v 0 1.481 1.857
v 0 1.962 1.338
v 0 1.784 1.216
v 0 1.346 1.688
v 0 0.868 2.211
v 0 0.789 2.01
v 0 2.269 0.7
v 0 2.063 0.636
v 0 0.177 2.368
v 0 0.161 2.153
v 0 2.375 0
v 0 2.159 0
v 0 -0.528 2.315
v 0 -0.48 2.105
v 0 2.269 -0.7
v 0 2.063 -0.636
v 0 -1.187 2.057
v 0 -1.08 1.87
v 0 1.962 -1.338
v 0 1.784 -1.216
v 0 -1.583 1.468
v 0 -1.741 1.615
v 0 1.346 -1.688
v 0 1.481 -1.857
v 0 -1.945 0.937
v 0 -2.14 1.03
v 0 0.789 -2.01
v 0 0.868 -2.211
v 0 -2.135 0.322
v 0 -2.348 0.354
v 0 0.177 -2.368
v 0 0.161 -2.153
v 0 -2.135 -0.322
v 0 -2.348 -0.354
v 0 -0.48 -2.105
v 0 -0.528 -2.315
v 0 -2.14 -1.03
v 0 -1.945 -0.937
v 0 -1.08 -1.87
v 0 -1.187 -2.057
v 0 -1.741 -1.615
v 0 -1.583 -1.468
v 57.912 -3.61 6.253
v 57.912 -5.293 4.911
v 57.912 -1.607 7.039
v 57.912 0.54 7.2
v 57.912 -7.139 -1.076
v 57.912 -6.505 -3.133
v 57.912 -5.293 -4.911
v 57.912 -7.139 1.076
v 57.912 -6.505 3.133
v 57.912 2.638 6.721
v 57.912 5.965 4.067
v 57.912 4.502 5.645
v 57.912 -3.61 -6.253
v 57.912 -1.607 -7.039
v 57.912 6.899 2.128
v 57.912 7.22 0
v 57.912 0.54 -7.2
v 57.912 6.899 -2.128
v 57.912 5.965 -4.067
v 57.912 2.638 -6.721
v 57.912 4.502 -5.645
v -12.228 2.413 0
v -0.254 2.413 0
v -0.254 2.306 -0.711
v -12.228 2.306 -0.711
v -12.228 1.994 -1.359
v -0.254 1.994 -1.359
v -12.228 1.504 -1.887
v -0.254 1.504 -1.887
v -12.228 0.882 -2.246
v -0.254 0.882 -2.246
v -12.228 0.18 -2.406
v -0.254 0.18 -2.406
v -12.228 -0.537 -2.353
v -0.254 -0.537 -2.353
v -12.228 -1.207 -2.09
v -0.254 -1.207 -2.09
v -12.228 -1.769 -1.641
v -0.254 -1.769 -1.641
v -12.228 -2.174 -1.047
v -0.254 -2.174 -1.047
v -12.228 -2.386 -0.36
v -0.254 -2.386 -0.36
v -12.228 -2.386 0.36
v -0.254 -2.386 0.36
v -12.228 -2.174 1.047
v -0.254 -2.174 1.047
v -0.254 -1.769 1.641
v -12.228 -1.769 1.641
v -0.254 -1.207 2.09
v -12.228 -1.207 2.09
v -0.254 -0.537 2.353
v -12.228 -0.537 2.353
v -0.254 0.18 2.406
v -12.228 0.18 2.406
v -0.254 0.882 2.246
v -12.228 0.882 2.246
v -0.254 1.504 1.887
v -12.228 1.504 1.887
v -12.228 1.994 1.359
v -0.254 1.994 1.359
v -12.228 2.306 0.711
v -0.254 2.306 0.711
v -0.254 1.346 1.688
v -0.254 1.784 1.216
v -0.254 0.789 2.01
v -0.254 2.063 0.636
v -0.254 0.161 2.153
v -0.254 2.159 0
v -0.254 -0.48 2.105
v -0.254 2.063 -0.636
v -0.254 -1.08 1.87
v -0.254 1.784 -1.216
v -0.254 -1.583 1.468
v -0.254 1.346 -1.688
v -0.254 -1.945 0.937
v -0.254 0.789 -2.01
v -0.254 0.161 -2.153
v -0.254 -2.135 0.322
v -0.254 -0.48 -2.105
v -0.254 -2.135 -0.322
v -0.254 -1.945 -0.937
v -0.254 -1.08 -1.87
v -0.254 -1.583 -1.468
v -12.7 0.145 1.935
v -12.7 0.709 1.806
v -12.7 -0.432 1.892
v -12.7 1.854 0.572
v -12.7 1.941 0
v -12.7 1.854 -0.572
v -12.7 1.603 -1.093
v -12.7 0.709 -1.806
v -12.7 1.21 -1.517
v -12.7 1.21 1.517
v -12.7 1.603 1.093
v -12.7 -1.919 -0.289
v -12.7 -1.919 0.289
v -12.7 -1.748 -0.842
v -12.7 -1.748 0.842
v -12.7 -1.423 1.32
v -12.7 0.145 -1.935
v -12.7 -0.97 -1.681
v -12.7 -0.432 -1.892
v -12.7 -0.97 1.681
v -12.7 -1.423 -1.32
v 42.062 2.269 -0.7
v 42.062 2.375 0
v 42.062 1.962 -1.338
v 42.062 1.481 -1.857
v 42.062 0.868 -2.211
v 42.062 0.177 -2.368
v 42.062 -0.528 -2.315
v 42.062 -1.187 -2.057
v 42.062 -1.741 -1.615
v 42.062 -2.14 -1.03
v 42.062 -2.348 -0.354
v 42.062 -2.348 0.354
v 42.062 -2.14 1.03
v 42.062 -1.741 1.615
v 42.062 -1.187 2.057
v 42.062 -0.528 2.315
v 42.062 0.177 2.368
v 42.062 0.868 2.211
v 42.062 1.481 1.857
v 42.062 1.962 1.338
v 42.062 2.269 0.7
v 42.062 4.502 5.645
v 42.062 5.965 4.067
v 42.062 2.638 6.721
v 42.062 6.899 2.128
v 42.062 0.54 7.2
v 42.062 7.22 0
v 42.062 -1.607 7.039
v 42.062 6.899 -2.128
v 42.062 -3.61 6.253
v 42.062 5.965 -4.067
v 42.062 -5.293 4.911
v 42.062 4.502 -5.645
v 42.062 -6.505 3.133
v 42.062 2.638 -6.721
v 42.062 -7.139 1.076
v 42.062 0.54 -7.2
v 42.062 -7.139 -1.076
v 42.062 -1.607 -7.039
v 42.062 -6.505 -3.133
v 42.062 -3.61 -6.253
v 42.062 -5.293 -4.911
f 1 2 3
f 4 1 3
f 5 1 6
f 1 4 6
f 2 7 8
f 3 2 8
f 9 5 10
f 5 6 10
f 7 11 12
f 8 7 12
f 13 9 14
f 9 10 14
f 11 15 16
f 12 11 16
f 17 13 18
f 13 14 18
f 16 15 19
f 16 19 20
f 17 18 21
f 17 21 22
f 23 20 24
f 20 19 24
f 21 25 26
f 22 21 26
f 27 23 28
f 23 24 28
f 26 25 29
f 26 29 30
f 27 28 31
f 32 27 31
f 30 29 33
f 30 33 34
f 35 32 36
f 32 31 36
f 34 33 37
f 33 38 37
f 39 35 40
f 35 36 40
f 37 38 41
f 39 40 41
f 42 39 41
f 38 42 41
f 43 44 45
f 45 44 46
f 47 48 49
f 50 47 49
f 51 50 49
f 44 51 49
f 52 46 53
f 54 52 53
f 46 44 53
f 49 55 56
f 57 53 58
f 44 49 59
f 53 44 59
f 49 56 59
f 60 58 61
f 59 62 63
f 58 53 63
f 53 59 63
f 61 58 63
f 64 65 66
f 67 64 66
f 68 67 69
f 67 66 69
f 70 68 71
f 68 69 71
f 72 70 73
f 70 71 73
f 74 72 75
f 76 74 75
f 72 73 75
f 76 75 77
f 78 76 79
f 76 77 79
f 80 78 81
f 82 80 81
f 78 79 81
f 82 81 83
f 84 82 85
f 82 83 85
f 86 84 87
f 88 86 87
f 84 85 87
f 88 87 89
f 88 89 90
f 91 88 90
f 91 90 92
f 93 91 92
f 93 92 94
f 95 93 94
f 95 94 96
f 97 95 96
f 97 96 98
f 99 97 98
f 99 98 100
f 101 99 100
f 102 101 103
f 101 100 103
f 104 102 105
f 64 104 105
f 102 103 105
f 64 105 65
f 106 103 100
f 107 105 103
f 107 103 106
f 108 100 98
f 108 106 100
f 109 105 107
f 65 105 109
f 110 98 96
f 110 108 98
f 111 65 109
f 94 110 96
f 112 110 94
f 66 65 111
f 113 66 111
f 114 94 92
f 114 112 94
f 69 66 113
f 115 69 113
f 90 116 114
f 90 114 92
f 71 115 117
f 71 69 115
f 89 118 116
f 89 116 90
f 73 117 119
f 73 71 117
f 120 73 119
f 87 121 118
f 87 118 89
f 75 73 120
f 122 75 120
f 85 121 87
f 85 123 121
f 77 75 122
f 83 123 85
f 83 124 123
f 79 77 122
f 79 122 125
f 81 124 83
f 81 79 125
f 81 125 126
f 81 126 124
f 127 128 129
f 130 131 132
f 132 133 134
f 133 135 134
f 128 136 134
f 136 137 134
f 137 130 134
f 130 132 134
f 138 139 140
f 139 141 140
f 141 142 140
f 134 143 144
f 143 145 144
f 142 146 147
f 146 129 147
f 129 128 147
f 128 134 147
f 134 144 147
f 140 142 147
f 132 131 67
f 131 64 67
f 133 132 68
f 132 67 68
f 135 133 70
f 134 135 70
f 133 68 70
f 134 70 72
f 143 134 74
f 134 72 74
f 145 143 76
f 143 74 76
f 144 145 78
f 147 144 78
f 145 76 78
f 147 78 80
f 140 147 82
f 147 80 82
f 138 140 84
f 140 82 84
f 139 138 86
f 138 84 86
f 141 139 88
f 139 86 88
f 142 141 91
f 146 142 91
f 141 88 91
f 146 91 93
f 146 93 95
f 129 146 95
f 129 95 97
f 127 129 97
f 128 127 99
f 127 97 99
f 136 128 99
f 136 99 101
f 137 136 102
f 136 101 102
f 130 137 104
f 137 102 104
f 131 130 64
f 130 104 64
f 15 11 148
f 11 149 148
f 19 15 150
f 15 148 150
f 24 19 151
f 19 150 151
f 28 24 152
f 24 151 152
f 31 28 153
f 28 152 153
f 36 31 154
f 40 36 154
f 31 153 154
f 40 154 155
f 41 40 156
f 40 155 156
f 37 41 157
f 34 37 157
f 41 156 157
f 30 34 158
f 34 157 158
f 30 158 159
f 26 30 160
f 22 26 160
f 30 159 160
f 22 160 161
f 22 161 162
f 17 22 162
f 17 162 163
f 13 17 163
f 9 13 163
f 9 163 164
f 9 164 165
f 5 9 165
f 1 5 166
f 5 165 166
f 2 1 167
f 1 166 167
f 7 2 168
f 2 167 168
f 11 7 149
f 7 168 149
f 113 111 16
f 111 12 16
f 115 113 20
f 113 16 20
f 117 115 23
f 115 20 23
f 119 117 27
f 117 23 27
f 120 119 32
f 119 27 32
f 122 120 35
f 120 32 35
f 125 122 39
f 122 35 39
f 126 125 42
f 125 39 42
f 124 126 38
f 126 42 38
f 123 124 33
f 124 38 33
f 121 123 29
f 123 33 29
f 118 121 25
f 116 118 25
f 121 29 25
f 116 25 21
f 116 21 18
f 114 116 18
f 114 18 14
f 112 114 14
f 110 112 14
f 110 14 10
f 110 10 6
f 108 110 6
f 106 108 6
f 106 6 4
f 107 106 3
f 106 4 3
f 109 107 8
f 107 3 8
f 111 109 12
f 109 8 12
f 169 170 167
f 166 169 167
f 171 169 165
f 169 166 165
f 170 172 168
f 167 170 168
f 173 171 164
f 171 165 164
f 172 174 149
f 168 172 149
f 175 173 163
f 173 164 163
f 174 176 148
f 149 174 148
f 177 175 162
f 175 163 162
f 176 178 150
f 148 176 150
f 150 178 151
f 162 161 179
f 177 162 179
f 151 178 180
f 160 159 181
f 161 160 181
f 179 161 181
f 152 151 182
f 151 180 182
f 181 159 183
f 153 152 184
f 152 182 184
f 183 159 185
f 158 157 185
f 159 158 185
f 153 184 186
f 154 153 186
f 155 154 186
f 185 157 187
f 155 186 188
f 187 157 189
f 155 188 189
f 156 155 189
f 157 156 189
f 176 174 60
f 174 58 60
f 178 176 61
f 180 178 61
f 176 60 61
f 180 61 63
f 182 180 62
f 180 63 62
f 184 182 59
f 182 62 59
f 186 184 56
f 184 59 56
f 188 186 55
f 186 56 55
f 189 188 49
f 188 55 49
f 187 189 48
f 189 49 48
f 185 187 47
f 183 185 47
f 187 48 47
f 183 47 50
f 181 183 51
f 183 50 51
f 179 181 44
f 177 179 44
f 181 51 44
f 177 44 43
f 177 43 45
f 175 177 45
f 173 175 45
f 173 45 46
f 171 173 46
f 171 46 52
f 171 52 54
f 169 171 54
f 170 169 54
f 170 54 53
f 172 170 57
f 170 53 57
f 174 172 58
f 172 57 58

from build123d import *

# Parameters (mm, degrees)
SKETCH3_W = 0.254
SKETCH3_H = 0.508


with BuildPart() as part:
    # Sketch1 → Revolve1 (revolve)
    with BuildSketch(Plane.XY):
        Polygon((0, 0), (0, 2.3749), (42.0624, 2.3749), (42.0624, 7.21995), (57.912, 7.21995), (57.912, 0), align=None)
    revolve(axis=Axis((57.912, 0, 0), (-1, 0, 0)))

    # Sketch2 → Revolve2 (revolve)
    with BuildSketch(Plane.XY):
        Polygon((-12.7, 0), (-12.7, 1.94056), (-12.22756, 2.413), (0, 2.413), (0, 0), align=None)
    revolve(axis=Axis((0, 0, 0), (-1, 0, 0)))

    # Sketch3 → Cut-Revolve1 (revolve, cut)
    with BuildSketch(Plane.XY):
        with Locations((-0.127, 2.413)):
            Rectangle(SKETCH3_W, SKETCH3_H)
    revolve(axis=Axis((0, 0, 0), (-1, 0, 0)), mode=Mode.SUBTRACT)


solid = part.part
